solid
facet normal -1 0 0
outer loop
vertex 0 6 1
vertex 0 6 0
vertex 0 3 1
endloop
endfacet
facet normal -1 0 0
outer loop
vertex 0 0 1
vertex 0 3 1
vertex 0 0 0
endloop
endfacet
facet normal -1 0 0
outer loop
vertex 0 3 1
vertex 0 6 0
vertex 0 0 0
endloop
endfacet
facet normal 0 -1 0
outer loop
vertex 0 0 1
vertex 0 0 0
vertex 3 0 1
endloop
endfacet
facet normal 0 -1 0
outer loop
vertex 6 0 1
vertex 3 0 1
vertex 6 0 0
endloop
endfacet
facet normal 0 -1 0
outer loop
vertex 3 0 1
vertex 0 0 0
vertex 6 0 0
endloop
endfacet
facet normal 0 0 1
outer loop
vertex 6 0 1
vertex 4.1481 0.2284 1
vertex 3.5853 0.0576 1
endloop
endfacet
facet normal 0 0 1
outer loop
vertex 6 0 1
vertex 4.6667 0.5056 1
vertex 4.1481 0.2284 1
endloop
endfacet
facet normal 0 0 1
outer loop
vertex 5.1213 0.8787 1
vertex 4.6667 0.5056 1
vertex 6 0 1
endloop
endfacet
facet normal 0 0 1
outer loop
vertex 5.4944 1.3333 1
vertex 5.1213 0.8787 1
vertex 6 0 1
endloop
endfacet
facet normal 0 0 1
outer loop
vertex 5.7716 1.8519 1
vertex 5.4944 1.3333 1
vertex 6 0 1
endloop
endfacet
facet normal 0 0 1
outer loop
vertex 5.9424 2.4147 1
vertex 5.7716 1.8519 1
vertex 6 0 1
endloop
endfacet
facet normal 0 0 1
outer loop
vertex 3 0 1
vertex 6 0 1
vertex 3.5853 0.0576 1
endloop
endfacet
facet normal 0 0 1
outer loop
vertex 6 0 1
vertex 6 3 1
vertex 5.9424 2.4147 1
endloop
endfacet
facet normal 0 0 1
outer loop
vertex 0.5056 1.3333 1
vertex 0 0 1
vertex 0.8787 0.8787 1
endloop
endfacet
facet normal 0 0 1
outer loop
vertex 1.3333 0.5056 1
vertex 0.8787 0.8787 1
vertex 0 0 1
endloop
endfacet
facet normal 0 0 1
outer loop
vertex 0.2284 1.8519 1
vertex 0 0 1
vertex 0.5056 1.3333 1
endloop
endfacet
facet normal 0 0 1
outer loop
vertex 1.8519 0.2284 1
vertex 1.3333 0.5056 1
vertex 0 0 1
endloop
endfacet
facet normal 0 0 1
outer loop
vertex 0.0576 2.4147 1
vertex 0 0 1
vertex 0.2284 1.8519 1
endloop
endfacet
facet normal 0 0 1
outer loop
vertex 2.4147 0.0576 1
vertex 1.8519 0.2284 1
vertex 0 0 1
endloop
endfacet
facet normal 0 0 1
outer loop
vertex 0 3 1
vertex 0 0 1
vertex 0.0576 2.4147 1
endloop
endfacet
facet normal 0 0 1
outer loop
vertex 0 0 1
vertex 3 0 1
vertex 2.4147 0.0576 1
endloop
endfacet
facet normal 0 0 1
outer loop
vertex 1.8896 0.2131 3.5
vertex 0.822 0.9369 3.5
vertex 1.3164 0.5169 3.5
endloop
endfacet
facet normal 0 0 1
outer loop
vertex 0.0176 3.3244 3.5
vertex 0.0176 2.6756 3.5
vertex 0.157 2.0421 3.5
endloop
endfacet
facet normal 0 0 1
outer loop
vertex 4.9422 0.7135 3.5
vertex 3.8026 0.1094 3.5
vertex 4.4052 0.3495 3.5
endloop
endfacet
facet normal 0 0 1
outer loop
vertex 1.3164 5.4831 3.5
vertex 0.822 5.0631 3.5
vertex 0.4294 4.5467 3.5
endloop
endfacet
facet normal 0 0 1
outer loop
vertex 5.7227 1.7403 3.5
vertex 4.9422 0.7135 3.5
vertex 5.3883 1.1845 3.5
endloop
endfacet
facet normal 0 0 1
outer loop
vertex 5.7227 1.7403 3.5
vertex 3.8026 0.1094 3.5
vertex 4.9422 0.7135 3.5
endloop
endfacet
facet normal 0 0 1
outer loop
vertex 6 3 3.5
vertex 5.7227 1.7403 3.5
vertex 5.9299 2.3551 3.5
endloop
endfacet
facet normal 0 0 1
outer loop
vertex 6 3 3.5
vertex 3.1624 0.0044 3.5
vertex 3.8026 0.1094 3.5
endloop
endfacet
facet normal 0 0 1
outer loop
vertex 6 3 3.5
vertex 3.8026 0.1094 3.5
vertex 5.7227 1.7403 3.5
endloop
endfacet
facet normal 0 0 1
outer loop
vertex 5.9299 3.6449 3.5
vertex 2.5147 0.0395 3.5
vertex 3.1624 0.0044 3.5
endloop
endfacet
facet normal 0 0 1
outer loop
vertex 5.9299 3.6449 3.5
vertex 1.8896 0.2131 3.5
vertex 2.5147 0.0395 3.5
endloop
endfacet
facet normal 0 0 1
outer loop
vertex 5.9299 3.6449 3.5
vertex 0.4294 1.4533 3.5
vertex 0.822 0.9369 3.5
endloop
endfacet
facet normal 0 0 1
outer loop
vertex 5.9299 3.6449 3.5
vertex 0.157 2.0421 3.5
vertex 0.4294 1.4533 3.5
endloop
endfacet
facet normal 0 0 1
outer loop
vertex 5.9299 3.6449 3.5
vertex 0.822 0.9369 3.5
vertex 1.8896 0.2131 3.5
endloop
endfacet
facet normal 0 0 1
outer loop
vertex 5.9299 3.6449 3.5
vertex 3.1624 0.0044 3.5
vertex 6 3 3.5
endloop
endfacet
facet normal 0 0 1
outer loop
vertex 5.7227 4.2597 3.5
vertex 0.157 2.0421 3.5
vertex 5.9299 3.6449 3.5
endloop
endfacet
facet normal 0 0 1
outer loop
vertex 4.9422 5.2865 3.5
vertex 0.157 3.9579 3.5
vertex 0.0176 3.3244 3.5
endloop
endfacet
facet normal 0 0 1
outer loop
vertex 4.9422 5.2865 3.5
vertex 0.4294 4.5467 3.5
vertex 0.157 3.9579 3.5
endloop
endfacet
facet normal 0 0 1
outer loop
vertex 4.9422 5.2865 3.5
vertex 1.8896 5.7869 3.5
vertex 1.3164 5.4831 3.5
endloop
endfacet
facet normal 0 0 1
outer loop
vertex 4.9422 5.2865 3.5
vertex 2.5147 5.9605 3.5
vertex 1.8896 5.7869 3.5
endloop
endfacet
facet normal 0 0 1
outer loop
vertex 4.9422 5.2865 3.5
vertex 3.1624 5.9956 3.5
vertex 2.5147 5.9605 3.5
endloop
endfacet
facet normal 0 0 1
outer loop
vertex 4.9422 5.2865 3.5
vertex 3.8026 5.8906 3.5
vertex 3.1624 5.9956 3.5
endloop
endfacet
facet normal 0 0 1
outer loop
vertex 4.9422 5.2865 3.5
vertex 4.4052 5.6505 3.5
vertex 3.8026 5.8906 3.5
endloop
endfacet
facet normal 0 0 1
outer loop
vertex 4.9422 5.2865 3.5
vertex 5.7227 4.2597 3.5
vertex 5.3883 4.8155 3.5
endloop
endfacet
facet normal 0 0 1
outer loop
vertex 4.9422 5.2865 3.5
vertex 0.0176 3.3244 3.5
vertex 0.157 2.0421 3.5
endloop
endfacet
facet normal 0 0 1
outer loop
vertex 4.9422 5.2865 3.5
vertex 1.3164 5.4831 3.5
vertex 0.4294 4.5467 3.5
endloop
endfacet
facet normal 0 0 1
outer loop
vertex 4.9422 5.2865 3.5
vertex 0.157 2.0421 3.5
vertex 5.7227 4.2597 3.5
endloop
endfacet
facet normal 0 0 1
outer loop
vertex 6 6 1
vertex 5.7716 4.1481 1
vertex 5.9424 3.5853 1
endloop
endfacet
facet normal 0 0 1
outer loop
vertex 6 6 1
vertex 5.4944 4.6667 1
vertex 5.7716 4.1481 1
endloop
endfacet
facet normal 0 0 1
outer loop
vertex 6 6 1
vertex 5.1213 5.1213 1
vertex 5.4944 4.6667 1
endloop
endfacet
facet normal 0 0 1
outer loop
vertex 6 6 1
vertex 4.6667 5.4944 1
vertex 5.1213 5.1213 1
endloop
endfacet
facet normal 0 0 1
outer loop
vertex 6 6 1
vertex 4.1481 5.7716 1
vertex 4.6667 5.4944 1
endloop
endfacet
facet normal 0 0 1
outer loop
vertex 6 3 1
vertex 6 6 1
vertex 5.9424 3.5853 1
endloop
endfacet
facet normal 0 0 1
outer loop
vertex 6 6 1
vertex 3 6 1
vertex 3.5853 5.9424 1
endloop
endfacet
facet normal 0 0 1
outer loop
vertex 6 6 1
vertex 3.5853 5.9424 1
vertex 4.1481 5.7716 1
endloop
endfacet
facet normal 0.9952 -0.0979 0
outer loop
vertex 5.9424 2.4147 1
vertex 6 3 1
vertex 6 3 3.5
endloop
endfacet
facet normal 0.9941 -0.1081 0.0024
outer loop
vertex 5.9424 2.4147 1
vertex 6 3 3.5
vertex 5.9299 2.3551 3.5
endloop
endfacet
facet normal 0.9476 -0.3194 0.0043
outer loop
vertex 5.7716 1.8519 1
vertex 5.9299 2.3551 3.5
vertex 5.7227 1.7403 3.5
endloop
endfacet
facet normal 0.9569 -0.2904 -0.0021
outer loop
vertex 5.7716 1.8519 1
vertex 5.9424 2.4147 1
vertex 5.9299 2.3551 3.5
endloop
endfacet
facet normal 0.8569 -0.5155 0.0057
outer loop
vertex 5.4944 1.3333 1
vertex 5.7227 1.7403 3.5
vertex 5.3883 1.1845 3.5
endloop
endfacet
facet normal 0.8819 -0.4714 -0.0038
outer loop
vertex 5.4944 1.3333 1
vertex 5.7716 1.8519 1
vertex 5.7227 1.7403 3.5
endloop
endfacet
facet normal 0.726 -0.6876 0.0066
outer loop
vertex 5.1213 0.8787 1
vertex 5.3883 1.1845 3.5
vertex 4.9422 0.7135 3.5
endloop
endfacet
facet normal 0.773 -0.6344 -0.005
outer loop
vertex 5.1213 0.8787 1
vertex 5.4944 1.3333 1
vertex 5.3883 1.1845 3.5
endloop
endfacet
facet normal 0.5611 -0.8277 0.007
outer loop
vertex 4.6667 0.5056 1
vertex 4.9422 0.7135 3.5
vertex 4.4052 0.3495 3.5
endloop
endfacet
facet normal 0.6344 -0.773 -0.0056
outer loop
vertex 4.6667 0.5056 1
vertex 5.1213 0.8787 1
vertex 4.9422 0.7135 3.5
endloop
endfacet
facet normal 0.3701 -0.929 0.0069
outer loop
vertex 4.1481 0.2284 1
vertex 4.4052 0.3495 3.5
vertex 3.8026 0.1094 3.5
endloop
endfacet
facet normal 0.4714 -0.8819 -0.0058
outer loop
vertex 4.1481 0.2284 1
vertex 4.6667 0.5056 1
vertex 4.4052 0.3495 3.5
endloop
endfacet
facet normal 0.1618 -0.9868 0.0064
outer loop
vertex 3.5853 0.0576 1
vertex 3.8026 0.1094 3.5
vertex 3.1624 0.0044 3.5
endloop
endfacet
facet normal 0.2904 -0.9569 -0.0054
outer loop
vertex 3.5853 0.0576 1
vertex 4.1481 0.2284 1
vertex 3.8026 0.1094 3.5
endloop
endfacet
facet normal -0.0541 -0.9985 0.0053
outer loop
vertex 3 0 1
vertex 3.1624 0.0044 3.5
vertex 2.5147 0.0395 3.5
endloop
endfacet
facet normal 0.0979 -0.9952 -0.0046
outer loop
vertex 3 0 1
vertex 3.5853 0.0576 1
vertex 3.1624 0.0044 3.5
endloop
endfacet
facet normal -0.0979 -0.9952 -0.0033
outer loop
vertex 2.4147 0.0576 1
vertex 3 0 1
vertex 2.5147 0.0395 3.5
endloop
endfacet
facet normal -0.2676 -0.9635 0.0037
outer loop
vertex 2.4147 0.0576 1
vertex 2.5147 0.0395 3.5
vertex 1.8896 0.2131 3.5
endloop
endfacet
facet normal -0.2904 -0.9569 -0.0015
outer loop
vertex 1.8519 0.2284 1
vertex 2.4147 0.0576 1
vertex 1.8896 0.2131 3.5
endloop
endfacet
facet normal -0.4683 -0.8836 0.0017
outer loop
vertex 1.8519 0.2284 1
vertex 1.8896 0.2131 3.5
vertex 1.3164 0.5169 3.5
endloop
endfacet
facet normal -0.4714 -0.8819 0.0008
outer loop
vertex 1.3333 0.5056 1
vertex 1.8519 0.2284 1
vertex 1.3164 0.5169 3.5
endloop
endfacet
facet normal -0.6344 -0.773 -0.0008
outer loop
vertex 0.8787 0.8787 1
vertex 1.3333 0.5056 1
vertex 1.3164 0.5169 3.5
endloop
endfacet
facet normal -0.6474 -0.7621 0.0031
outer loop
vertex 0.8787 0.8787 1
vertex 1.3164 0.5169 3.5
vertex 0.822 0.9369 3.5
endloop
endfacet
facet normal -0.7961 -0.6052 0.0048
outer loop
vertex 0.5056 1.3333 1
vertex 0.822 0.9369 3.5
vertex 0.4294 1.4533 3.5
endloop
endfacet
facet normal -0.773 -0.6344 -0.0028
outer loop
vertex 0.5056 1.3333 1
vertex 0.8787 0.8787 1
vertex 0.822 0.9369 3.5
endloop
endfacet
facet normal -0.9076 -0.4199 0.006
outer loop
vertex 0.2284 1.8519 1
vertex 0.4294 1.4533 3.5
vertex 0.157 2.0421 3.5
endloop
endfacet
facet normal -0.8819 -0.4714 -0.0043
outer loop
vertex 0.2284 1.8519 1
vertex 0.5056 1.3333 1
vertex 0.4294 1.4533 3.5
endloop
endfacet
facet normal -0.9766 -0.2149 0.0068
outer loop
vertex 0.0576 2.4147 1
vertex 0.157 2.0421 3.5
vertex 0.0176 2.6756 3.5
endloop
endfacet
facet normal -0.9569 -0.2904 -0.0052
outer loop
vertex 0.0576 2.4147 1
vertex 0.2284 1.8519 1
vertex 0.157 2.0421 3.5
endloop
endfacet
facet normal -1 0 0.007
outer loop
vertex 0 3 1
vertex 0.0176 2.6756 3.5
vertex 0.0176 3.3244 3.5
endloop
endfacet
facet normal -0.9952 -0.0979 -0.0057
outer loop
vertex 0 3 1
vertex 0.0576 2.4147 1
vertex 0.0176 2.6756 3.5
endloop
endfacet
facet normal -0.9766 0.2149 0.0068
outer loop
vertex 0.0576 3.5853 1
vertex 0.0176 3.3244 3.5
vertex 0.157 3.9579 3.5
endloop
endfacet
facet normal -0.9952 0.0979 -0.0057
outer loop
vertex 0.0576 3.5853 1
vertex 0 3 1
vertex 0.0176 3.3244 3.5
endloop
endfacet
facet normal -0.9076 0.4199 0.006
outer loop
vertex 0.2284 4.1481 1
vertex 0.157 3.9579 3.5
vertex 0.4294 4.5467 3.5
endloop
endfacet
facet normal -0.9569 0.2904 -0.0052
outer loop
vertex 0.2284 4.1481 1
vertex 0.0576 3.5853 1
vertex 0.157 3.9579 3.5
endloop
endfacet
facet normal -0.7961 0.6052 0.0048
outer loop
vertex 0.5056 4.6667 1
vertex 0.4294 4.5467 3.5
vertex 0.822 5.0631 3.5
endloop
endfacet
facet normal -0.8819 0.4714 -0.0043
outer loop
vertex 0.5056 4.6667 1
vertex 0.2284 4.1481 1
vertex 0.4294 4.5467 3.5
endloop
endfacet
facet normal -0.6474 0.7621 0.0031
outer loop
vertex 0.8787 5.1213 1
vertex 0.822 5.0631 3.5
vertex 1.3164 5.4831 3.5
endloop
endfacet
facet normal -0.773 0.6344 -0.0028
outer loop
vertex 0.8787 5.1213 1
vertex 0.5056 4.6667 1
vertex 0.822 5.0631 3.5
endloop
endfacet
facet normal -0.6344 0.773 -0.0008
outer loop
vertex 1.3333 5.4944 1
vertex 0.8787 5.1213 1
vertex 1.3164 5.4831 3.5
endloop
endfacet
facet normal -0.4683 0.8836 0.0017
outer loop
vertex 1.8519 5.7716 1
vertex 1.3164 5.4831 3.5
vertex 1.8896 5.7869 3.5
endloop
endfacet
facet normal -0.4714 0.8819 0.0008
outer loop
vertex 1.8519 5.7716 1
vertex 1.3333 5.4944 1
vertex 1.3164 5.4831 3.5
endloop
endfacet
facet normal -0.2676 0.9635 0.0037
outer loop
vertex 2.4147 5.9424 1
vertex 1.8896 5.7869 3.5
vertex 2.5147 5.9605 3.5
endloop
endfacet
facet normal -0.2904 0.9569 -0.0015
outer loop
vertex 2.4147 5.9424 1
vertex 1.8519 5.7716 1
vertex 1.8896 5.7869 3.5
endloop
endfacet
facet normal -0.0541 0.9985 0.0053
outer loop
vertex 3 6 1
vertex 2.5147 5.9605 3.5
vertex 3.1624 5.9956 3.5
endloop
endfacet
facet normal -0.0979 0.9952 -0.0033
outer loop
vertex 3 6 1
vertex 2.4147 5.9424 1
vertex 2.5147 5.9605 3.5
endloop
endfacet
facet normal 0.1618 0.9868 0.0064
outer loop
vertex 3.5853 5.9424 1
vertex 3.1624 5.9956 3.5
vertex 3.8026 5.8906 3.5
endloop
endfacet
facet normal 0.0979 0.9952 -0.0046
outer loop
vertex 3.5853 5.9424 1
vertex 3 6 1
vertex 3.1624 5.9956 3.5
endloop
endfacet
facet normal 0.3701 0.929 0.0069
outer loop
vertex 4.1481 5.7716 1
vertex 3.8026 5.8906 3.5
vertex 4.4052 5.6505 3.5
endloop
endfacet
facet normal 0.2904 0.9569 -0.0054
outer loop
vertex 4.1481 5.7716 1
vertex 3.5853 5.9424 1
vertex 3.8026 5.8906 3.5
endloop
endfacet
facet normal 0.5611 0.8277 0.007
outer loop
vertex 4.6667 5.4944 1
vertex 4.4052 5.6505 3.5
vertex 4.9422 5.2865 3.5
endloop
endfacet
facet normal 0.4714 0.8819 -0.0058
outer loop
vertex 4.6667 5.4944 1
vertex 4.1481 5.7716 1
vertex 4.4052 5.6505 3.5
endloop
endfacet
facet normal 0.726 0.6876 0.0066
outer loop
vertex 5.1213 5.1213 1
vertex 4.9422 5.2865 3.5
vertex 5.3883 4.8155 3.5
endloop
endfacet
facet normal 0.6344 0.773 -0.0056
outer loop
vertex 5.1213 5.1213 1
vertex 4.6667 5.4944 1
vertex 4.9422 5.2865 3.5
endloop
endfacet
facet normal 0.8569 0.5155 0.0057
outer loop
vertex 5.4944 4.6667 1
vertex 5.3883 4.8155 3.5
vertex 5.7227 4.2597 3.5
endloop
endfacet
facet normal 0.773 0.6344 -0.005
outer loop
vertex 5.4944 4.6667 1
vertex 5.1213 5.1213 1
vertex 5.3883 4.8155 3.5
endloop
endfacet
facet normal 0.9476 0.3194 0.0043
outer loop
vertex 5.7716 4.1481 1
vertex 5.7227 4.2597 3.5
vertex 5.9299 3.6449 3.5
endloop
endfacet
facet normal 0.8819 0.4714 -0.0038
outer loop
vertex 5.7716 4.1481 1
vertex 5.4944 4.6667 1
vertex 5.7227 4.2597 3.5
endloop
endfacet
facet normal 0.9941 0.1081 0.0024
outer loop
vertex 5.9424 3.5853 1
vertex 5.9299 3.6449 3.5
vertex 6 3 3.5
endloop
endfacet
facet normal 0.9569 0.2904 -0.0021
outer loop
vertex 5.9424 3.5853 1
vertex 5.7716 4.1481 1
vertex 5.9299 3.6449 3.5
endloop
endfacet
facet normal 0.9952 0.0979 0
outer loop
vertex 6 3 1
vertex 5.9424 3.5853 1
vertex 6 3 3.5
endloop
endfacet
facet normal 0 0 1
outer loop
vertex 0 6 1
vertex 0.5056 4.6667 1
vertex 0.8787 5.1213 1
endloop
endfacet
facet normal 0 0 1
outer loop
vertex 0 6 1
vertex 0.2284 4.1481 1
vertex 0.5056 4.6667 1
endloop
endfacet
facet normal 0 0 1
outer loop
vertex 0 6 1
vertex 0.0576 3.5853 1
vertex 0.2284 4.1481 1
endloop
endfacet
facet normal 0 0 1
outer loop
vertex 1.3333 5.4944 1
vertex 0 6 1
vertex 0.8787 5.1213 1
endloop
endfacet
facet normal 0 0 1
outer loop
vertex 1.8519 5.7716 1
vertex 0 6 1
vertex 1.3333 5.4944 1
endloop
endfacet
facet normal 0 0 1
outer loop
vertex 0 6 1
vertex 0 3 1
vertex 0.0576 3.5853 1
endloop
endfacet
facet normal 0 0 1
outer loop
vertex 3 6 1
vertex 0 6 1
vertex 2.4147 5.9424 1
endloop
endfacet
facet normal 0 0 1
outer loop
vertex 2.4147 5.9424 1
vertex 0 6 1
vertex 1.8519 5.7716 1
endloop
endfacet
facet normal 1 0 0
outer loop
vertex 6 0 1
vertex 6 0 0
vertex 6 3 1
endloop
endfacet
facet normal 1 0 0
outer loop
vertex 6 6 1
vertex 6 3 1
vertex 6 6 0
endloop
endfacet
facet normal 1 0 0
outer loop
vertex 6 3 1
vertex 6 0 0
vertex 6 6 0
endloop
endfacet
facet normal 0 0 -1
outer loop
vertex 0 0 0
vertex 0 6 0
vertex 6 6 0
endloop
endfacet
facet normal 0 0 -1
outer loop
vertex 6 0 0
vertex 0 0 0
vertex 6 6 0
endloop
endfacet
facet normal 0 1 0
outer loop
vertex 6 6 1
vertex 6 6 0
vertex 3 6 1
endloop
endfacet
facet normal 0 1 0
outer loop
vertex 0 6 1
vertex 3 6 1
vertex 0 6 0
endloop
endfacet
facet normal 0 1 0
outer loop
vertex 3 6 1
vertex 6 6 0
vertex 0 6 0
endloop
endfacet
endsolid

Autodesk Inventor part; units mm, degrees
ref_plane "YZ Plane" through (0, 0, 0) normal (1, 0, 0) x (0, 1, 0)
ref_plane "XZ Plane" through (0, 0, 0) normal (0, 1, 0) x (-1, 0, 0)
ref_plane "XY Plane" through (0, 0, 0) normal (0, 0, 1) x (1, 0, 0)
sketch "Sketch1" plane through (0, 0, 0) normal (0, 0, 1) x (1, 0, 0)
  line L0 (0, 0) -> (6, 0)
  line L1 (6, 0) -> (6, 6)
  line L2 (6, 6) -> (0, 6)
  line L3 (0, 6) -> (0, 0)
  dimension "d0" = 6
  dimension "d1" = 6
extrude "Extrusion1" add sketch "Sketch1" along normal blind 1
sketch "Sketch2" plane through (0, 0, 1) normal (0, 0, 1) x (1, 0, 0)
  circle A0 centre (3, 3) radius 3
  line L0 (0, 6) -> (0, 0) projected
  line L1 (0, 0) -> (6, 0) projected
  dimension "d4" = 6
  dimension "d5" = 3
  dimension "d6" = 3
extrude "Extrusion2" add sketch "Sketch2" along normal blind 2.5 contours A0
properties part number "Servo_bit"
